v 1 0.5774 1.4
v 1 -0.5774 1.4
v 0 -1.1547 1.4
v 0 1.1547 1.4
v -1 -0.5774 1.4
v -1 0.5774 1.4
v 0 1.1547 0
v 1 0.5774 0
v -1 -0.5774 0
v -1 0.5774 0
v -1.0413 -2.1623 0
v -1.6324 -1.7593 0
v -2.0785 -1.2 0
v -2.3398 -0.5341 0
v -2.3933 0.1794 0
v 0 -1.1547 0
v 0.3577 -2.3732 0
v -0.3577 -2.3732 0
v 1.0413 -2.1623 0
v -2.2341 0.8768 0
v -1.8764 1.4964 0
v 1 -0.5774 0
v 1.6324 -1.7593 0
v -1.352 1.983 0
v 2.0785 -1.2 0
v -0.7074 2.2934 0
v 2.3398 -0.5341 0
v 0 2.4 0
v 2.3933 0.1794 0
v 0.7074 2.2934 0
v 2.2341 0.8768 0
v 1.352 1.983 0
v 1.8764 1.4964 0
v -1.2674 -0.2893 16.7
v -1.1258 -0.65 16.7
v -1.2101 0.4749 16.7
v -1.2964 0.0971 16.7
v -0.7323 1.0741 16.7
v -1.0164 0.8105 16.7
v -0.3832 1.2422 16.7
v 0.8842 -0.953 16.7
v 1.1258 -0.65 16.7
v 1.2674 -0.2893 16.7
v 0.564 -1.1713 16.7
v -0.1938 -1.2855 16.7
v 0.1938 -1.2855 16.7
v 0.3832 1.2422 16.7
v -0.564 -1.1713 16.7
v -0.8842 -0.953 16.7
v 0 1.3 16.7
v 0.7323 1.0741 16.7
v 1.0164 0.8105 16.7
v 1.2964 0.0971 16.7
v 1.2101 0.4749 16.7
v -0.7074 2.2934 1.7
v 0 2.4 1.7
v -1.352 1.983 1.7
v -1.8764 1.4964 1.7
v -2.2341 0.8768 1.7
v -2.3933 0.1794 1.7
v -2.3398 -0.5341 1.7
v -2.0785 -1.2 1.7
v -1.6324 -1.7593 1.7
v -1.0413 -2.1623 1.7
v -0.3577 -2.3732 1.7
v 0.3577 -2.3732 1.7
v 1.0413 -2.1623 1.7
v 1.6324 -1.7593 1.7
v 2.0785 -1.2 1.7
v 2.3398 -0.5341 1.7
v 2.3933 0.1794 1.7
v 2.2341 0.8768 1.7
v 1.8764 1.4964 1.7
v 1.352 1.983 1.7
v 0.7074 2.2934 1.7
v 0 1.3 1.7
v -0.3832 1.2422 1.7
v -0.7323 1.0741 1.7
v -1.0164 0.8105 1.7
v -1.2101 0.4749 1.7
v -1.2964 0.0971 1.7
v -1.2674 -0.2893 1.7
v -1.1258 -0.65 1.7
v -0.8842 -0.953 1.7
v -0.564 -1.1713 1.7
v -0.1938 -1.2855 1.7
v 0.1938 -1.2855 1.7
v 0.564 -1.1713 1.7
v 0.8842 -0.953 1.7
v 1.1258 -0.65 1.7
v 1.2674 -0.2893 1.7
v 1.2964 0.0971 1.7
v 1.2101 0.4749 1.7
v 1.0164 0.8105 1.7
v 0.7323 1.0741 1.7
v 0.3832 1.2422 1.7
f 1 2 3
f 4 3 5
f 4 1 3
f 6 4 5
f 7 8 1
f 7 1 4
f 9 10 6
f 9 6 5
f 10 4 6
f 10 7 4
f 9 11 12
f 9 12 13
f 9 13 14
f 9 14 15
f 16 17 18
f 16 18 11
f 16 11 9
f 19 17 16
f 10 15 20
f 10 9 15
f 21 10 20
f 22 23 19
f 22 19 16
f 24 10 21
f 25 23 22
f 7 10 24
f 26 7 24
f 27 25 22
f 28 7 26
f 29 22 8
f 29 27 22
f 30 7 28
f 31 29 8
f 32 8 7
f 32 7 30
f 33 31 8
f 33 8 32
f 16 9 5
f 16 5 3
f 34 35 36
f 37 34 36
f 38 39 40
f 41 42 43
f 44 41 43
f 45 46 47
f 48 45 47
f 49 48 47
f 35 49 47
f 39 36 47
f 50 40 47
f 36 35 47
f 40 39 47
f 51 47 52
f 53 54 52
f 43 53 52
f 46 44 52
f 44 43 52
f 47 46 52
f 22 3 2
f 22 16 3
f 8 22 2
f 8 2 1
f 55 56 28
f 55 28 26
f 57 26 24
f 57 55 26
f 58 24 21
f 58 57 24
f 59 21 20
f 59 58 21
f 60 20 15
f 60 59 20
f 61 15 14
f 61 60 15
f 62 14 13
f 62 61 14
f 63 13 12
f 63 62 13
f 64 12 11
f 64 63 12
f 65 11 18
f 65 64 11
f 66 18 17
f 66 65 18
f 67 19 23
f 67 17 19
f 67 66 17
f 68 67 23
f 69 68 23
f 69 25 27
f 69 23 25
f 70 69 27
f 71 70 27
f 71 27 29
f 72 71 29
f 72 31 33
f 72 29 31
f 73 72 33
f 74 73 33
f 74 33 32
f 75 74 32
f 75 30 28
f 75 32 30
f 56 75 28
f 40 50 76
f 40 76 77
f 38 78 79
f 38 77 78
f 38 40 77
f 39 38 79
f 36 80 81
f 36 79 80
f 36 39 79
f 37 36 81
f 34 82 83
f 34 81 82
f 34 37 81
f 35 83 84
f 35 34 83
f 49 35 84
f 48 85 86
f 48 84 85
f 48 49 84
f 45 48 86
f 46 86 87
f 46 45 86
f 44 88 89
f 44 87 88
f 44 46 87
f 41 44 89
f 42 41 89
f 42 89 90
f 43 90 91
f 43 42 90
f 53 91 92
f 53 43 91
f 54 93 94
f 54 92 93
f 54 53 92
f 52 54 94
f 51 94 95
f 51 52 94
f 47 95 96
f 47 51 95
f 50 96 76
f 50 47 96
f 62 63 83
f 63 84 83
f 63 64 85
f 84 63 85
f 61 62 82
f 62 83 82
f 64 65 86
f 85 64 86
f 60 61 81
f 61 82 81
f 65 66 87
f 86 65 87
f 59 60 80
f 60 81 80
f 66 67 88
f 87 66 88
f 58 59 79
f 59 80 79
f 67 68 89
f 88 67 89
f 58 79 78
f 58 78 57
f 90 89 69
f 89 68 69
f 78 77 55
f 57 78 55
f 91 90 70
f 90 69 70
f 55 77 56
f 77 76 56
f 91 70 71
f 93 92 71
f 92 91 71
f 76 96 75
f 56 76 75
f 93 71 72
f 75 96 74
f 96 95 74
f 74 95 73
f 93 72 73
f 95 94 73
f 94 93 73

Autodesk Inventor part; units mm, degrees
ref_plane "YZ Plane" through (0, 0, 0) normal (1, 0, 0) x (0, 1, 0)
ref_plane "XZ Plane" through (0, 0, 0) normal (0, 1, 0) x (-1, 0, 0)
ref_plane "XY Plane" through (0, 0, 0) normal (0, 0, 1) x (1, 0, 0)
sketch "スケッチ1" plane through (0, 0, 0) normal (1, 0, 0) x (0, 1, 0)
  line L0 (0, 16.7) -> (0, 0)
  line L1 (0, 0) -> (2.4, 0)
  line L2 (2.4, 0) -> (2.4, 1.7)
  line L3 (2.4, 1.7) -> (1.3, 1.7)
  line L4 (1.3, 1.7) -> (1.3, 16.7)
  line L5 (1.3, 16.7) -> (0, 16.7)
  dimension "d2" = 1.7
  dimension "d10" = 15
  dimension "d11" = 2.6
  dimension "d12" = 4.8
revolve "回転1" add sketch "スケッチ1" angle 360 about axis through (0, 0, 16.7) along (0, 0, -1)
thread "ねじ1" size "M2.6x0.45" class "6g" standard "ANSI Metric M Profile" full length
sketch "スケッチ2" plane through (0, 0, 0) normal (0, 0, -1) x (-1, 0, 0)
  line L0 (0, 1.1547) -> (1, 0.5774)
  line L1 (1, 0.5774) -> (1, -0.5774)
  line L2 (1, -0.5774) -> (0, -1.1547)
  line L3 (0, -1.1547) -> (-1, -0.5774)
  line L4 (-1, -0.5774) -> (-1, 0.5774)
  line L5 (-1, 0.5774) -> (0, 1.1547)
  line L6 (0, 2.4) -> (0, -2.4) construction
  circle A0 centre (0, 0) radius 2.4 projected
  dimension "d7" = 2
extrude "押し出し1" cut sketch "スケッチ2" against normal blind 1.4 contours L0 L1 L2 L3 L4 L5
properties part number "M2_6-15" material "チタン"
